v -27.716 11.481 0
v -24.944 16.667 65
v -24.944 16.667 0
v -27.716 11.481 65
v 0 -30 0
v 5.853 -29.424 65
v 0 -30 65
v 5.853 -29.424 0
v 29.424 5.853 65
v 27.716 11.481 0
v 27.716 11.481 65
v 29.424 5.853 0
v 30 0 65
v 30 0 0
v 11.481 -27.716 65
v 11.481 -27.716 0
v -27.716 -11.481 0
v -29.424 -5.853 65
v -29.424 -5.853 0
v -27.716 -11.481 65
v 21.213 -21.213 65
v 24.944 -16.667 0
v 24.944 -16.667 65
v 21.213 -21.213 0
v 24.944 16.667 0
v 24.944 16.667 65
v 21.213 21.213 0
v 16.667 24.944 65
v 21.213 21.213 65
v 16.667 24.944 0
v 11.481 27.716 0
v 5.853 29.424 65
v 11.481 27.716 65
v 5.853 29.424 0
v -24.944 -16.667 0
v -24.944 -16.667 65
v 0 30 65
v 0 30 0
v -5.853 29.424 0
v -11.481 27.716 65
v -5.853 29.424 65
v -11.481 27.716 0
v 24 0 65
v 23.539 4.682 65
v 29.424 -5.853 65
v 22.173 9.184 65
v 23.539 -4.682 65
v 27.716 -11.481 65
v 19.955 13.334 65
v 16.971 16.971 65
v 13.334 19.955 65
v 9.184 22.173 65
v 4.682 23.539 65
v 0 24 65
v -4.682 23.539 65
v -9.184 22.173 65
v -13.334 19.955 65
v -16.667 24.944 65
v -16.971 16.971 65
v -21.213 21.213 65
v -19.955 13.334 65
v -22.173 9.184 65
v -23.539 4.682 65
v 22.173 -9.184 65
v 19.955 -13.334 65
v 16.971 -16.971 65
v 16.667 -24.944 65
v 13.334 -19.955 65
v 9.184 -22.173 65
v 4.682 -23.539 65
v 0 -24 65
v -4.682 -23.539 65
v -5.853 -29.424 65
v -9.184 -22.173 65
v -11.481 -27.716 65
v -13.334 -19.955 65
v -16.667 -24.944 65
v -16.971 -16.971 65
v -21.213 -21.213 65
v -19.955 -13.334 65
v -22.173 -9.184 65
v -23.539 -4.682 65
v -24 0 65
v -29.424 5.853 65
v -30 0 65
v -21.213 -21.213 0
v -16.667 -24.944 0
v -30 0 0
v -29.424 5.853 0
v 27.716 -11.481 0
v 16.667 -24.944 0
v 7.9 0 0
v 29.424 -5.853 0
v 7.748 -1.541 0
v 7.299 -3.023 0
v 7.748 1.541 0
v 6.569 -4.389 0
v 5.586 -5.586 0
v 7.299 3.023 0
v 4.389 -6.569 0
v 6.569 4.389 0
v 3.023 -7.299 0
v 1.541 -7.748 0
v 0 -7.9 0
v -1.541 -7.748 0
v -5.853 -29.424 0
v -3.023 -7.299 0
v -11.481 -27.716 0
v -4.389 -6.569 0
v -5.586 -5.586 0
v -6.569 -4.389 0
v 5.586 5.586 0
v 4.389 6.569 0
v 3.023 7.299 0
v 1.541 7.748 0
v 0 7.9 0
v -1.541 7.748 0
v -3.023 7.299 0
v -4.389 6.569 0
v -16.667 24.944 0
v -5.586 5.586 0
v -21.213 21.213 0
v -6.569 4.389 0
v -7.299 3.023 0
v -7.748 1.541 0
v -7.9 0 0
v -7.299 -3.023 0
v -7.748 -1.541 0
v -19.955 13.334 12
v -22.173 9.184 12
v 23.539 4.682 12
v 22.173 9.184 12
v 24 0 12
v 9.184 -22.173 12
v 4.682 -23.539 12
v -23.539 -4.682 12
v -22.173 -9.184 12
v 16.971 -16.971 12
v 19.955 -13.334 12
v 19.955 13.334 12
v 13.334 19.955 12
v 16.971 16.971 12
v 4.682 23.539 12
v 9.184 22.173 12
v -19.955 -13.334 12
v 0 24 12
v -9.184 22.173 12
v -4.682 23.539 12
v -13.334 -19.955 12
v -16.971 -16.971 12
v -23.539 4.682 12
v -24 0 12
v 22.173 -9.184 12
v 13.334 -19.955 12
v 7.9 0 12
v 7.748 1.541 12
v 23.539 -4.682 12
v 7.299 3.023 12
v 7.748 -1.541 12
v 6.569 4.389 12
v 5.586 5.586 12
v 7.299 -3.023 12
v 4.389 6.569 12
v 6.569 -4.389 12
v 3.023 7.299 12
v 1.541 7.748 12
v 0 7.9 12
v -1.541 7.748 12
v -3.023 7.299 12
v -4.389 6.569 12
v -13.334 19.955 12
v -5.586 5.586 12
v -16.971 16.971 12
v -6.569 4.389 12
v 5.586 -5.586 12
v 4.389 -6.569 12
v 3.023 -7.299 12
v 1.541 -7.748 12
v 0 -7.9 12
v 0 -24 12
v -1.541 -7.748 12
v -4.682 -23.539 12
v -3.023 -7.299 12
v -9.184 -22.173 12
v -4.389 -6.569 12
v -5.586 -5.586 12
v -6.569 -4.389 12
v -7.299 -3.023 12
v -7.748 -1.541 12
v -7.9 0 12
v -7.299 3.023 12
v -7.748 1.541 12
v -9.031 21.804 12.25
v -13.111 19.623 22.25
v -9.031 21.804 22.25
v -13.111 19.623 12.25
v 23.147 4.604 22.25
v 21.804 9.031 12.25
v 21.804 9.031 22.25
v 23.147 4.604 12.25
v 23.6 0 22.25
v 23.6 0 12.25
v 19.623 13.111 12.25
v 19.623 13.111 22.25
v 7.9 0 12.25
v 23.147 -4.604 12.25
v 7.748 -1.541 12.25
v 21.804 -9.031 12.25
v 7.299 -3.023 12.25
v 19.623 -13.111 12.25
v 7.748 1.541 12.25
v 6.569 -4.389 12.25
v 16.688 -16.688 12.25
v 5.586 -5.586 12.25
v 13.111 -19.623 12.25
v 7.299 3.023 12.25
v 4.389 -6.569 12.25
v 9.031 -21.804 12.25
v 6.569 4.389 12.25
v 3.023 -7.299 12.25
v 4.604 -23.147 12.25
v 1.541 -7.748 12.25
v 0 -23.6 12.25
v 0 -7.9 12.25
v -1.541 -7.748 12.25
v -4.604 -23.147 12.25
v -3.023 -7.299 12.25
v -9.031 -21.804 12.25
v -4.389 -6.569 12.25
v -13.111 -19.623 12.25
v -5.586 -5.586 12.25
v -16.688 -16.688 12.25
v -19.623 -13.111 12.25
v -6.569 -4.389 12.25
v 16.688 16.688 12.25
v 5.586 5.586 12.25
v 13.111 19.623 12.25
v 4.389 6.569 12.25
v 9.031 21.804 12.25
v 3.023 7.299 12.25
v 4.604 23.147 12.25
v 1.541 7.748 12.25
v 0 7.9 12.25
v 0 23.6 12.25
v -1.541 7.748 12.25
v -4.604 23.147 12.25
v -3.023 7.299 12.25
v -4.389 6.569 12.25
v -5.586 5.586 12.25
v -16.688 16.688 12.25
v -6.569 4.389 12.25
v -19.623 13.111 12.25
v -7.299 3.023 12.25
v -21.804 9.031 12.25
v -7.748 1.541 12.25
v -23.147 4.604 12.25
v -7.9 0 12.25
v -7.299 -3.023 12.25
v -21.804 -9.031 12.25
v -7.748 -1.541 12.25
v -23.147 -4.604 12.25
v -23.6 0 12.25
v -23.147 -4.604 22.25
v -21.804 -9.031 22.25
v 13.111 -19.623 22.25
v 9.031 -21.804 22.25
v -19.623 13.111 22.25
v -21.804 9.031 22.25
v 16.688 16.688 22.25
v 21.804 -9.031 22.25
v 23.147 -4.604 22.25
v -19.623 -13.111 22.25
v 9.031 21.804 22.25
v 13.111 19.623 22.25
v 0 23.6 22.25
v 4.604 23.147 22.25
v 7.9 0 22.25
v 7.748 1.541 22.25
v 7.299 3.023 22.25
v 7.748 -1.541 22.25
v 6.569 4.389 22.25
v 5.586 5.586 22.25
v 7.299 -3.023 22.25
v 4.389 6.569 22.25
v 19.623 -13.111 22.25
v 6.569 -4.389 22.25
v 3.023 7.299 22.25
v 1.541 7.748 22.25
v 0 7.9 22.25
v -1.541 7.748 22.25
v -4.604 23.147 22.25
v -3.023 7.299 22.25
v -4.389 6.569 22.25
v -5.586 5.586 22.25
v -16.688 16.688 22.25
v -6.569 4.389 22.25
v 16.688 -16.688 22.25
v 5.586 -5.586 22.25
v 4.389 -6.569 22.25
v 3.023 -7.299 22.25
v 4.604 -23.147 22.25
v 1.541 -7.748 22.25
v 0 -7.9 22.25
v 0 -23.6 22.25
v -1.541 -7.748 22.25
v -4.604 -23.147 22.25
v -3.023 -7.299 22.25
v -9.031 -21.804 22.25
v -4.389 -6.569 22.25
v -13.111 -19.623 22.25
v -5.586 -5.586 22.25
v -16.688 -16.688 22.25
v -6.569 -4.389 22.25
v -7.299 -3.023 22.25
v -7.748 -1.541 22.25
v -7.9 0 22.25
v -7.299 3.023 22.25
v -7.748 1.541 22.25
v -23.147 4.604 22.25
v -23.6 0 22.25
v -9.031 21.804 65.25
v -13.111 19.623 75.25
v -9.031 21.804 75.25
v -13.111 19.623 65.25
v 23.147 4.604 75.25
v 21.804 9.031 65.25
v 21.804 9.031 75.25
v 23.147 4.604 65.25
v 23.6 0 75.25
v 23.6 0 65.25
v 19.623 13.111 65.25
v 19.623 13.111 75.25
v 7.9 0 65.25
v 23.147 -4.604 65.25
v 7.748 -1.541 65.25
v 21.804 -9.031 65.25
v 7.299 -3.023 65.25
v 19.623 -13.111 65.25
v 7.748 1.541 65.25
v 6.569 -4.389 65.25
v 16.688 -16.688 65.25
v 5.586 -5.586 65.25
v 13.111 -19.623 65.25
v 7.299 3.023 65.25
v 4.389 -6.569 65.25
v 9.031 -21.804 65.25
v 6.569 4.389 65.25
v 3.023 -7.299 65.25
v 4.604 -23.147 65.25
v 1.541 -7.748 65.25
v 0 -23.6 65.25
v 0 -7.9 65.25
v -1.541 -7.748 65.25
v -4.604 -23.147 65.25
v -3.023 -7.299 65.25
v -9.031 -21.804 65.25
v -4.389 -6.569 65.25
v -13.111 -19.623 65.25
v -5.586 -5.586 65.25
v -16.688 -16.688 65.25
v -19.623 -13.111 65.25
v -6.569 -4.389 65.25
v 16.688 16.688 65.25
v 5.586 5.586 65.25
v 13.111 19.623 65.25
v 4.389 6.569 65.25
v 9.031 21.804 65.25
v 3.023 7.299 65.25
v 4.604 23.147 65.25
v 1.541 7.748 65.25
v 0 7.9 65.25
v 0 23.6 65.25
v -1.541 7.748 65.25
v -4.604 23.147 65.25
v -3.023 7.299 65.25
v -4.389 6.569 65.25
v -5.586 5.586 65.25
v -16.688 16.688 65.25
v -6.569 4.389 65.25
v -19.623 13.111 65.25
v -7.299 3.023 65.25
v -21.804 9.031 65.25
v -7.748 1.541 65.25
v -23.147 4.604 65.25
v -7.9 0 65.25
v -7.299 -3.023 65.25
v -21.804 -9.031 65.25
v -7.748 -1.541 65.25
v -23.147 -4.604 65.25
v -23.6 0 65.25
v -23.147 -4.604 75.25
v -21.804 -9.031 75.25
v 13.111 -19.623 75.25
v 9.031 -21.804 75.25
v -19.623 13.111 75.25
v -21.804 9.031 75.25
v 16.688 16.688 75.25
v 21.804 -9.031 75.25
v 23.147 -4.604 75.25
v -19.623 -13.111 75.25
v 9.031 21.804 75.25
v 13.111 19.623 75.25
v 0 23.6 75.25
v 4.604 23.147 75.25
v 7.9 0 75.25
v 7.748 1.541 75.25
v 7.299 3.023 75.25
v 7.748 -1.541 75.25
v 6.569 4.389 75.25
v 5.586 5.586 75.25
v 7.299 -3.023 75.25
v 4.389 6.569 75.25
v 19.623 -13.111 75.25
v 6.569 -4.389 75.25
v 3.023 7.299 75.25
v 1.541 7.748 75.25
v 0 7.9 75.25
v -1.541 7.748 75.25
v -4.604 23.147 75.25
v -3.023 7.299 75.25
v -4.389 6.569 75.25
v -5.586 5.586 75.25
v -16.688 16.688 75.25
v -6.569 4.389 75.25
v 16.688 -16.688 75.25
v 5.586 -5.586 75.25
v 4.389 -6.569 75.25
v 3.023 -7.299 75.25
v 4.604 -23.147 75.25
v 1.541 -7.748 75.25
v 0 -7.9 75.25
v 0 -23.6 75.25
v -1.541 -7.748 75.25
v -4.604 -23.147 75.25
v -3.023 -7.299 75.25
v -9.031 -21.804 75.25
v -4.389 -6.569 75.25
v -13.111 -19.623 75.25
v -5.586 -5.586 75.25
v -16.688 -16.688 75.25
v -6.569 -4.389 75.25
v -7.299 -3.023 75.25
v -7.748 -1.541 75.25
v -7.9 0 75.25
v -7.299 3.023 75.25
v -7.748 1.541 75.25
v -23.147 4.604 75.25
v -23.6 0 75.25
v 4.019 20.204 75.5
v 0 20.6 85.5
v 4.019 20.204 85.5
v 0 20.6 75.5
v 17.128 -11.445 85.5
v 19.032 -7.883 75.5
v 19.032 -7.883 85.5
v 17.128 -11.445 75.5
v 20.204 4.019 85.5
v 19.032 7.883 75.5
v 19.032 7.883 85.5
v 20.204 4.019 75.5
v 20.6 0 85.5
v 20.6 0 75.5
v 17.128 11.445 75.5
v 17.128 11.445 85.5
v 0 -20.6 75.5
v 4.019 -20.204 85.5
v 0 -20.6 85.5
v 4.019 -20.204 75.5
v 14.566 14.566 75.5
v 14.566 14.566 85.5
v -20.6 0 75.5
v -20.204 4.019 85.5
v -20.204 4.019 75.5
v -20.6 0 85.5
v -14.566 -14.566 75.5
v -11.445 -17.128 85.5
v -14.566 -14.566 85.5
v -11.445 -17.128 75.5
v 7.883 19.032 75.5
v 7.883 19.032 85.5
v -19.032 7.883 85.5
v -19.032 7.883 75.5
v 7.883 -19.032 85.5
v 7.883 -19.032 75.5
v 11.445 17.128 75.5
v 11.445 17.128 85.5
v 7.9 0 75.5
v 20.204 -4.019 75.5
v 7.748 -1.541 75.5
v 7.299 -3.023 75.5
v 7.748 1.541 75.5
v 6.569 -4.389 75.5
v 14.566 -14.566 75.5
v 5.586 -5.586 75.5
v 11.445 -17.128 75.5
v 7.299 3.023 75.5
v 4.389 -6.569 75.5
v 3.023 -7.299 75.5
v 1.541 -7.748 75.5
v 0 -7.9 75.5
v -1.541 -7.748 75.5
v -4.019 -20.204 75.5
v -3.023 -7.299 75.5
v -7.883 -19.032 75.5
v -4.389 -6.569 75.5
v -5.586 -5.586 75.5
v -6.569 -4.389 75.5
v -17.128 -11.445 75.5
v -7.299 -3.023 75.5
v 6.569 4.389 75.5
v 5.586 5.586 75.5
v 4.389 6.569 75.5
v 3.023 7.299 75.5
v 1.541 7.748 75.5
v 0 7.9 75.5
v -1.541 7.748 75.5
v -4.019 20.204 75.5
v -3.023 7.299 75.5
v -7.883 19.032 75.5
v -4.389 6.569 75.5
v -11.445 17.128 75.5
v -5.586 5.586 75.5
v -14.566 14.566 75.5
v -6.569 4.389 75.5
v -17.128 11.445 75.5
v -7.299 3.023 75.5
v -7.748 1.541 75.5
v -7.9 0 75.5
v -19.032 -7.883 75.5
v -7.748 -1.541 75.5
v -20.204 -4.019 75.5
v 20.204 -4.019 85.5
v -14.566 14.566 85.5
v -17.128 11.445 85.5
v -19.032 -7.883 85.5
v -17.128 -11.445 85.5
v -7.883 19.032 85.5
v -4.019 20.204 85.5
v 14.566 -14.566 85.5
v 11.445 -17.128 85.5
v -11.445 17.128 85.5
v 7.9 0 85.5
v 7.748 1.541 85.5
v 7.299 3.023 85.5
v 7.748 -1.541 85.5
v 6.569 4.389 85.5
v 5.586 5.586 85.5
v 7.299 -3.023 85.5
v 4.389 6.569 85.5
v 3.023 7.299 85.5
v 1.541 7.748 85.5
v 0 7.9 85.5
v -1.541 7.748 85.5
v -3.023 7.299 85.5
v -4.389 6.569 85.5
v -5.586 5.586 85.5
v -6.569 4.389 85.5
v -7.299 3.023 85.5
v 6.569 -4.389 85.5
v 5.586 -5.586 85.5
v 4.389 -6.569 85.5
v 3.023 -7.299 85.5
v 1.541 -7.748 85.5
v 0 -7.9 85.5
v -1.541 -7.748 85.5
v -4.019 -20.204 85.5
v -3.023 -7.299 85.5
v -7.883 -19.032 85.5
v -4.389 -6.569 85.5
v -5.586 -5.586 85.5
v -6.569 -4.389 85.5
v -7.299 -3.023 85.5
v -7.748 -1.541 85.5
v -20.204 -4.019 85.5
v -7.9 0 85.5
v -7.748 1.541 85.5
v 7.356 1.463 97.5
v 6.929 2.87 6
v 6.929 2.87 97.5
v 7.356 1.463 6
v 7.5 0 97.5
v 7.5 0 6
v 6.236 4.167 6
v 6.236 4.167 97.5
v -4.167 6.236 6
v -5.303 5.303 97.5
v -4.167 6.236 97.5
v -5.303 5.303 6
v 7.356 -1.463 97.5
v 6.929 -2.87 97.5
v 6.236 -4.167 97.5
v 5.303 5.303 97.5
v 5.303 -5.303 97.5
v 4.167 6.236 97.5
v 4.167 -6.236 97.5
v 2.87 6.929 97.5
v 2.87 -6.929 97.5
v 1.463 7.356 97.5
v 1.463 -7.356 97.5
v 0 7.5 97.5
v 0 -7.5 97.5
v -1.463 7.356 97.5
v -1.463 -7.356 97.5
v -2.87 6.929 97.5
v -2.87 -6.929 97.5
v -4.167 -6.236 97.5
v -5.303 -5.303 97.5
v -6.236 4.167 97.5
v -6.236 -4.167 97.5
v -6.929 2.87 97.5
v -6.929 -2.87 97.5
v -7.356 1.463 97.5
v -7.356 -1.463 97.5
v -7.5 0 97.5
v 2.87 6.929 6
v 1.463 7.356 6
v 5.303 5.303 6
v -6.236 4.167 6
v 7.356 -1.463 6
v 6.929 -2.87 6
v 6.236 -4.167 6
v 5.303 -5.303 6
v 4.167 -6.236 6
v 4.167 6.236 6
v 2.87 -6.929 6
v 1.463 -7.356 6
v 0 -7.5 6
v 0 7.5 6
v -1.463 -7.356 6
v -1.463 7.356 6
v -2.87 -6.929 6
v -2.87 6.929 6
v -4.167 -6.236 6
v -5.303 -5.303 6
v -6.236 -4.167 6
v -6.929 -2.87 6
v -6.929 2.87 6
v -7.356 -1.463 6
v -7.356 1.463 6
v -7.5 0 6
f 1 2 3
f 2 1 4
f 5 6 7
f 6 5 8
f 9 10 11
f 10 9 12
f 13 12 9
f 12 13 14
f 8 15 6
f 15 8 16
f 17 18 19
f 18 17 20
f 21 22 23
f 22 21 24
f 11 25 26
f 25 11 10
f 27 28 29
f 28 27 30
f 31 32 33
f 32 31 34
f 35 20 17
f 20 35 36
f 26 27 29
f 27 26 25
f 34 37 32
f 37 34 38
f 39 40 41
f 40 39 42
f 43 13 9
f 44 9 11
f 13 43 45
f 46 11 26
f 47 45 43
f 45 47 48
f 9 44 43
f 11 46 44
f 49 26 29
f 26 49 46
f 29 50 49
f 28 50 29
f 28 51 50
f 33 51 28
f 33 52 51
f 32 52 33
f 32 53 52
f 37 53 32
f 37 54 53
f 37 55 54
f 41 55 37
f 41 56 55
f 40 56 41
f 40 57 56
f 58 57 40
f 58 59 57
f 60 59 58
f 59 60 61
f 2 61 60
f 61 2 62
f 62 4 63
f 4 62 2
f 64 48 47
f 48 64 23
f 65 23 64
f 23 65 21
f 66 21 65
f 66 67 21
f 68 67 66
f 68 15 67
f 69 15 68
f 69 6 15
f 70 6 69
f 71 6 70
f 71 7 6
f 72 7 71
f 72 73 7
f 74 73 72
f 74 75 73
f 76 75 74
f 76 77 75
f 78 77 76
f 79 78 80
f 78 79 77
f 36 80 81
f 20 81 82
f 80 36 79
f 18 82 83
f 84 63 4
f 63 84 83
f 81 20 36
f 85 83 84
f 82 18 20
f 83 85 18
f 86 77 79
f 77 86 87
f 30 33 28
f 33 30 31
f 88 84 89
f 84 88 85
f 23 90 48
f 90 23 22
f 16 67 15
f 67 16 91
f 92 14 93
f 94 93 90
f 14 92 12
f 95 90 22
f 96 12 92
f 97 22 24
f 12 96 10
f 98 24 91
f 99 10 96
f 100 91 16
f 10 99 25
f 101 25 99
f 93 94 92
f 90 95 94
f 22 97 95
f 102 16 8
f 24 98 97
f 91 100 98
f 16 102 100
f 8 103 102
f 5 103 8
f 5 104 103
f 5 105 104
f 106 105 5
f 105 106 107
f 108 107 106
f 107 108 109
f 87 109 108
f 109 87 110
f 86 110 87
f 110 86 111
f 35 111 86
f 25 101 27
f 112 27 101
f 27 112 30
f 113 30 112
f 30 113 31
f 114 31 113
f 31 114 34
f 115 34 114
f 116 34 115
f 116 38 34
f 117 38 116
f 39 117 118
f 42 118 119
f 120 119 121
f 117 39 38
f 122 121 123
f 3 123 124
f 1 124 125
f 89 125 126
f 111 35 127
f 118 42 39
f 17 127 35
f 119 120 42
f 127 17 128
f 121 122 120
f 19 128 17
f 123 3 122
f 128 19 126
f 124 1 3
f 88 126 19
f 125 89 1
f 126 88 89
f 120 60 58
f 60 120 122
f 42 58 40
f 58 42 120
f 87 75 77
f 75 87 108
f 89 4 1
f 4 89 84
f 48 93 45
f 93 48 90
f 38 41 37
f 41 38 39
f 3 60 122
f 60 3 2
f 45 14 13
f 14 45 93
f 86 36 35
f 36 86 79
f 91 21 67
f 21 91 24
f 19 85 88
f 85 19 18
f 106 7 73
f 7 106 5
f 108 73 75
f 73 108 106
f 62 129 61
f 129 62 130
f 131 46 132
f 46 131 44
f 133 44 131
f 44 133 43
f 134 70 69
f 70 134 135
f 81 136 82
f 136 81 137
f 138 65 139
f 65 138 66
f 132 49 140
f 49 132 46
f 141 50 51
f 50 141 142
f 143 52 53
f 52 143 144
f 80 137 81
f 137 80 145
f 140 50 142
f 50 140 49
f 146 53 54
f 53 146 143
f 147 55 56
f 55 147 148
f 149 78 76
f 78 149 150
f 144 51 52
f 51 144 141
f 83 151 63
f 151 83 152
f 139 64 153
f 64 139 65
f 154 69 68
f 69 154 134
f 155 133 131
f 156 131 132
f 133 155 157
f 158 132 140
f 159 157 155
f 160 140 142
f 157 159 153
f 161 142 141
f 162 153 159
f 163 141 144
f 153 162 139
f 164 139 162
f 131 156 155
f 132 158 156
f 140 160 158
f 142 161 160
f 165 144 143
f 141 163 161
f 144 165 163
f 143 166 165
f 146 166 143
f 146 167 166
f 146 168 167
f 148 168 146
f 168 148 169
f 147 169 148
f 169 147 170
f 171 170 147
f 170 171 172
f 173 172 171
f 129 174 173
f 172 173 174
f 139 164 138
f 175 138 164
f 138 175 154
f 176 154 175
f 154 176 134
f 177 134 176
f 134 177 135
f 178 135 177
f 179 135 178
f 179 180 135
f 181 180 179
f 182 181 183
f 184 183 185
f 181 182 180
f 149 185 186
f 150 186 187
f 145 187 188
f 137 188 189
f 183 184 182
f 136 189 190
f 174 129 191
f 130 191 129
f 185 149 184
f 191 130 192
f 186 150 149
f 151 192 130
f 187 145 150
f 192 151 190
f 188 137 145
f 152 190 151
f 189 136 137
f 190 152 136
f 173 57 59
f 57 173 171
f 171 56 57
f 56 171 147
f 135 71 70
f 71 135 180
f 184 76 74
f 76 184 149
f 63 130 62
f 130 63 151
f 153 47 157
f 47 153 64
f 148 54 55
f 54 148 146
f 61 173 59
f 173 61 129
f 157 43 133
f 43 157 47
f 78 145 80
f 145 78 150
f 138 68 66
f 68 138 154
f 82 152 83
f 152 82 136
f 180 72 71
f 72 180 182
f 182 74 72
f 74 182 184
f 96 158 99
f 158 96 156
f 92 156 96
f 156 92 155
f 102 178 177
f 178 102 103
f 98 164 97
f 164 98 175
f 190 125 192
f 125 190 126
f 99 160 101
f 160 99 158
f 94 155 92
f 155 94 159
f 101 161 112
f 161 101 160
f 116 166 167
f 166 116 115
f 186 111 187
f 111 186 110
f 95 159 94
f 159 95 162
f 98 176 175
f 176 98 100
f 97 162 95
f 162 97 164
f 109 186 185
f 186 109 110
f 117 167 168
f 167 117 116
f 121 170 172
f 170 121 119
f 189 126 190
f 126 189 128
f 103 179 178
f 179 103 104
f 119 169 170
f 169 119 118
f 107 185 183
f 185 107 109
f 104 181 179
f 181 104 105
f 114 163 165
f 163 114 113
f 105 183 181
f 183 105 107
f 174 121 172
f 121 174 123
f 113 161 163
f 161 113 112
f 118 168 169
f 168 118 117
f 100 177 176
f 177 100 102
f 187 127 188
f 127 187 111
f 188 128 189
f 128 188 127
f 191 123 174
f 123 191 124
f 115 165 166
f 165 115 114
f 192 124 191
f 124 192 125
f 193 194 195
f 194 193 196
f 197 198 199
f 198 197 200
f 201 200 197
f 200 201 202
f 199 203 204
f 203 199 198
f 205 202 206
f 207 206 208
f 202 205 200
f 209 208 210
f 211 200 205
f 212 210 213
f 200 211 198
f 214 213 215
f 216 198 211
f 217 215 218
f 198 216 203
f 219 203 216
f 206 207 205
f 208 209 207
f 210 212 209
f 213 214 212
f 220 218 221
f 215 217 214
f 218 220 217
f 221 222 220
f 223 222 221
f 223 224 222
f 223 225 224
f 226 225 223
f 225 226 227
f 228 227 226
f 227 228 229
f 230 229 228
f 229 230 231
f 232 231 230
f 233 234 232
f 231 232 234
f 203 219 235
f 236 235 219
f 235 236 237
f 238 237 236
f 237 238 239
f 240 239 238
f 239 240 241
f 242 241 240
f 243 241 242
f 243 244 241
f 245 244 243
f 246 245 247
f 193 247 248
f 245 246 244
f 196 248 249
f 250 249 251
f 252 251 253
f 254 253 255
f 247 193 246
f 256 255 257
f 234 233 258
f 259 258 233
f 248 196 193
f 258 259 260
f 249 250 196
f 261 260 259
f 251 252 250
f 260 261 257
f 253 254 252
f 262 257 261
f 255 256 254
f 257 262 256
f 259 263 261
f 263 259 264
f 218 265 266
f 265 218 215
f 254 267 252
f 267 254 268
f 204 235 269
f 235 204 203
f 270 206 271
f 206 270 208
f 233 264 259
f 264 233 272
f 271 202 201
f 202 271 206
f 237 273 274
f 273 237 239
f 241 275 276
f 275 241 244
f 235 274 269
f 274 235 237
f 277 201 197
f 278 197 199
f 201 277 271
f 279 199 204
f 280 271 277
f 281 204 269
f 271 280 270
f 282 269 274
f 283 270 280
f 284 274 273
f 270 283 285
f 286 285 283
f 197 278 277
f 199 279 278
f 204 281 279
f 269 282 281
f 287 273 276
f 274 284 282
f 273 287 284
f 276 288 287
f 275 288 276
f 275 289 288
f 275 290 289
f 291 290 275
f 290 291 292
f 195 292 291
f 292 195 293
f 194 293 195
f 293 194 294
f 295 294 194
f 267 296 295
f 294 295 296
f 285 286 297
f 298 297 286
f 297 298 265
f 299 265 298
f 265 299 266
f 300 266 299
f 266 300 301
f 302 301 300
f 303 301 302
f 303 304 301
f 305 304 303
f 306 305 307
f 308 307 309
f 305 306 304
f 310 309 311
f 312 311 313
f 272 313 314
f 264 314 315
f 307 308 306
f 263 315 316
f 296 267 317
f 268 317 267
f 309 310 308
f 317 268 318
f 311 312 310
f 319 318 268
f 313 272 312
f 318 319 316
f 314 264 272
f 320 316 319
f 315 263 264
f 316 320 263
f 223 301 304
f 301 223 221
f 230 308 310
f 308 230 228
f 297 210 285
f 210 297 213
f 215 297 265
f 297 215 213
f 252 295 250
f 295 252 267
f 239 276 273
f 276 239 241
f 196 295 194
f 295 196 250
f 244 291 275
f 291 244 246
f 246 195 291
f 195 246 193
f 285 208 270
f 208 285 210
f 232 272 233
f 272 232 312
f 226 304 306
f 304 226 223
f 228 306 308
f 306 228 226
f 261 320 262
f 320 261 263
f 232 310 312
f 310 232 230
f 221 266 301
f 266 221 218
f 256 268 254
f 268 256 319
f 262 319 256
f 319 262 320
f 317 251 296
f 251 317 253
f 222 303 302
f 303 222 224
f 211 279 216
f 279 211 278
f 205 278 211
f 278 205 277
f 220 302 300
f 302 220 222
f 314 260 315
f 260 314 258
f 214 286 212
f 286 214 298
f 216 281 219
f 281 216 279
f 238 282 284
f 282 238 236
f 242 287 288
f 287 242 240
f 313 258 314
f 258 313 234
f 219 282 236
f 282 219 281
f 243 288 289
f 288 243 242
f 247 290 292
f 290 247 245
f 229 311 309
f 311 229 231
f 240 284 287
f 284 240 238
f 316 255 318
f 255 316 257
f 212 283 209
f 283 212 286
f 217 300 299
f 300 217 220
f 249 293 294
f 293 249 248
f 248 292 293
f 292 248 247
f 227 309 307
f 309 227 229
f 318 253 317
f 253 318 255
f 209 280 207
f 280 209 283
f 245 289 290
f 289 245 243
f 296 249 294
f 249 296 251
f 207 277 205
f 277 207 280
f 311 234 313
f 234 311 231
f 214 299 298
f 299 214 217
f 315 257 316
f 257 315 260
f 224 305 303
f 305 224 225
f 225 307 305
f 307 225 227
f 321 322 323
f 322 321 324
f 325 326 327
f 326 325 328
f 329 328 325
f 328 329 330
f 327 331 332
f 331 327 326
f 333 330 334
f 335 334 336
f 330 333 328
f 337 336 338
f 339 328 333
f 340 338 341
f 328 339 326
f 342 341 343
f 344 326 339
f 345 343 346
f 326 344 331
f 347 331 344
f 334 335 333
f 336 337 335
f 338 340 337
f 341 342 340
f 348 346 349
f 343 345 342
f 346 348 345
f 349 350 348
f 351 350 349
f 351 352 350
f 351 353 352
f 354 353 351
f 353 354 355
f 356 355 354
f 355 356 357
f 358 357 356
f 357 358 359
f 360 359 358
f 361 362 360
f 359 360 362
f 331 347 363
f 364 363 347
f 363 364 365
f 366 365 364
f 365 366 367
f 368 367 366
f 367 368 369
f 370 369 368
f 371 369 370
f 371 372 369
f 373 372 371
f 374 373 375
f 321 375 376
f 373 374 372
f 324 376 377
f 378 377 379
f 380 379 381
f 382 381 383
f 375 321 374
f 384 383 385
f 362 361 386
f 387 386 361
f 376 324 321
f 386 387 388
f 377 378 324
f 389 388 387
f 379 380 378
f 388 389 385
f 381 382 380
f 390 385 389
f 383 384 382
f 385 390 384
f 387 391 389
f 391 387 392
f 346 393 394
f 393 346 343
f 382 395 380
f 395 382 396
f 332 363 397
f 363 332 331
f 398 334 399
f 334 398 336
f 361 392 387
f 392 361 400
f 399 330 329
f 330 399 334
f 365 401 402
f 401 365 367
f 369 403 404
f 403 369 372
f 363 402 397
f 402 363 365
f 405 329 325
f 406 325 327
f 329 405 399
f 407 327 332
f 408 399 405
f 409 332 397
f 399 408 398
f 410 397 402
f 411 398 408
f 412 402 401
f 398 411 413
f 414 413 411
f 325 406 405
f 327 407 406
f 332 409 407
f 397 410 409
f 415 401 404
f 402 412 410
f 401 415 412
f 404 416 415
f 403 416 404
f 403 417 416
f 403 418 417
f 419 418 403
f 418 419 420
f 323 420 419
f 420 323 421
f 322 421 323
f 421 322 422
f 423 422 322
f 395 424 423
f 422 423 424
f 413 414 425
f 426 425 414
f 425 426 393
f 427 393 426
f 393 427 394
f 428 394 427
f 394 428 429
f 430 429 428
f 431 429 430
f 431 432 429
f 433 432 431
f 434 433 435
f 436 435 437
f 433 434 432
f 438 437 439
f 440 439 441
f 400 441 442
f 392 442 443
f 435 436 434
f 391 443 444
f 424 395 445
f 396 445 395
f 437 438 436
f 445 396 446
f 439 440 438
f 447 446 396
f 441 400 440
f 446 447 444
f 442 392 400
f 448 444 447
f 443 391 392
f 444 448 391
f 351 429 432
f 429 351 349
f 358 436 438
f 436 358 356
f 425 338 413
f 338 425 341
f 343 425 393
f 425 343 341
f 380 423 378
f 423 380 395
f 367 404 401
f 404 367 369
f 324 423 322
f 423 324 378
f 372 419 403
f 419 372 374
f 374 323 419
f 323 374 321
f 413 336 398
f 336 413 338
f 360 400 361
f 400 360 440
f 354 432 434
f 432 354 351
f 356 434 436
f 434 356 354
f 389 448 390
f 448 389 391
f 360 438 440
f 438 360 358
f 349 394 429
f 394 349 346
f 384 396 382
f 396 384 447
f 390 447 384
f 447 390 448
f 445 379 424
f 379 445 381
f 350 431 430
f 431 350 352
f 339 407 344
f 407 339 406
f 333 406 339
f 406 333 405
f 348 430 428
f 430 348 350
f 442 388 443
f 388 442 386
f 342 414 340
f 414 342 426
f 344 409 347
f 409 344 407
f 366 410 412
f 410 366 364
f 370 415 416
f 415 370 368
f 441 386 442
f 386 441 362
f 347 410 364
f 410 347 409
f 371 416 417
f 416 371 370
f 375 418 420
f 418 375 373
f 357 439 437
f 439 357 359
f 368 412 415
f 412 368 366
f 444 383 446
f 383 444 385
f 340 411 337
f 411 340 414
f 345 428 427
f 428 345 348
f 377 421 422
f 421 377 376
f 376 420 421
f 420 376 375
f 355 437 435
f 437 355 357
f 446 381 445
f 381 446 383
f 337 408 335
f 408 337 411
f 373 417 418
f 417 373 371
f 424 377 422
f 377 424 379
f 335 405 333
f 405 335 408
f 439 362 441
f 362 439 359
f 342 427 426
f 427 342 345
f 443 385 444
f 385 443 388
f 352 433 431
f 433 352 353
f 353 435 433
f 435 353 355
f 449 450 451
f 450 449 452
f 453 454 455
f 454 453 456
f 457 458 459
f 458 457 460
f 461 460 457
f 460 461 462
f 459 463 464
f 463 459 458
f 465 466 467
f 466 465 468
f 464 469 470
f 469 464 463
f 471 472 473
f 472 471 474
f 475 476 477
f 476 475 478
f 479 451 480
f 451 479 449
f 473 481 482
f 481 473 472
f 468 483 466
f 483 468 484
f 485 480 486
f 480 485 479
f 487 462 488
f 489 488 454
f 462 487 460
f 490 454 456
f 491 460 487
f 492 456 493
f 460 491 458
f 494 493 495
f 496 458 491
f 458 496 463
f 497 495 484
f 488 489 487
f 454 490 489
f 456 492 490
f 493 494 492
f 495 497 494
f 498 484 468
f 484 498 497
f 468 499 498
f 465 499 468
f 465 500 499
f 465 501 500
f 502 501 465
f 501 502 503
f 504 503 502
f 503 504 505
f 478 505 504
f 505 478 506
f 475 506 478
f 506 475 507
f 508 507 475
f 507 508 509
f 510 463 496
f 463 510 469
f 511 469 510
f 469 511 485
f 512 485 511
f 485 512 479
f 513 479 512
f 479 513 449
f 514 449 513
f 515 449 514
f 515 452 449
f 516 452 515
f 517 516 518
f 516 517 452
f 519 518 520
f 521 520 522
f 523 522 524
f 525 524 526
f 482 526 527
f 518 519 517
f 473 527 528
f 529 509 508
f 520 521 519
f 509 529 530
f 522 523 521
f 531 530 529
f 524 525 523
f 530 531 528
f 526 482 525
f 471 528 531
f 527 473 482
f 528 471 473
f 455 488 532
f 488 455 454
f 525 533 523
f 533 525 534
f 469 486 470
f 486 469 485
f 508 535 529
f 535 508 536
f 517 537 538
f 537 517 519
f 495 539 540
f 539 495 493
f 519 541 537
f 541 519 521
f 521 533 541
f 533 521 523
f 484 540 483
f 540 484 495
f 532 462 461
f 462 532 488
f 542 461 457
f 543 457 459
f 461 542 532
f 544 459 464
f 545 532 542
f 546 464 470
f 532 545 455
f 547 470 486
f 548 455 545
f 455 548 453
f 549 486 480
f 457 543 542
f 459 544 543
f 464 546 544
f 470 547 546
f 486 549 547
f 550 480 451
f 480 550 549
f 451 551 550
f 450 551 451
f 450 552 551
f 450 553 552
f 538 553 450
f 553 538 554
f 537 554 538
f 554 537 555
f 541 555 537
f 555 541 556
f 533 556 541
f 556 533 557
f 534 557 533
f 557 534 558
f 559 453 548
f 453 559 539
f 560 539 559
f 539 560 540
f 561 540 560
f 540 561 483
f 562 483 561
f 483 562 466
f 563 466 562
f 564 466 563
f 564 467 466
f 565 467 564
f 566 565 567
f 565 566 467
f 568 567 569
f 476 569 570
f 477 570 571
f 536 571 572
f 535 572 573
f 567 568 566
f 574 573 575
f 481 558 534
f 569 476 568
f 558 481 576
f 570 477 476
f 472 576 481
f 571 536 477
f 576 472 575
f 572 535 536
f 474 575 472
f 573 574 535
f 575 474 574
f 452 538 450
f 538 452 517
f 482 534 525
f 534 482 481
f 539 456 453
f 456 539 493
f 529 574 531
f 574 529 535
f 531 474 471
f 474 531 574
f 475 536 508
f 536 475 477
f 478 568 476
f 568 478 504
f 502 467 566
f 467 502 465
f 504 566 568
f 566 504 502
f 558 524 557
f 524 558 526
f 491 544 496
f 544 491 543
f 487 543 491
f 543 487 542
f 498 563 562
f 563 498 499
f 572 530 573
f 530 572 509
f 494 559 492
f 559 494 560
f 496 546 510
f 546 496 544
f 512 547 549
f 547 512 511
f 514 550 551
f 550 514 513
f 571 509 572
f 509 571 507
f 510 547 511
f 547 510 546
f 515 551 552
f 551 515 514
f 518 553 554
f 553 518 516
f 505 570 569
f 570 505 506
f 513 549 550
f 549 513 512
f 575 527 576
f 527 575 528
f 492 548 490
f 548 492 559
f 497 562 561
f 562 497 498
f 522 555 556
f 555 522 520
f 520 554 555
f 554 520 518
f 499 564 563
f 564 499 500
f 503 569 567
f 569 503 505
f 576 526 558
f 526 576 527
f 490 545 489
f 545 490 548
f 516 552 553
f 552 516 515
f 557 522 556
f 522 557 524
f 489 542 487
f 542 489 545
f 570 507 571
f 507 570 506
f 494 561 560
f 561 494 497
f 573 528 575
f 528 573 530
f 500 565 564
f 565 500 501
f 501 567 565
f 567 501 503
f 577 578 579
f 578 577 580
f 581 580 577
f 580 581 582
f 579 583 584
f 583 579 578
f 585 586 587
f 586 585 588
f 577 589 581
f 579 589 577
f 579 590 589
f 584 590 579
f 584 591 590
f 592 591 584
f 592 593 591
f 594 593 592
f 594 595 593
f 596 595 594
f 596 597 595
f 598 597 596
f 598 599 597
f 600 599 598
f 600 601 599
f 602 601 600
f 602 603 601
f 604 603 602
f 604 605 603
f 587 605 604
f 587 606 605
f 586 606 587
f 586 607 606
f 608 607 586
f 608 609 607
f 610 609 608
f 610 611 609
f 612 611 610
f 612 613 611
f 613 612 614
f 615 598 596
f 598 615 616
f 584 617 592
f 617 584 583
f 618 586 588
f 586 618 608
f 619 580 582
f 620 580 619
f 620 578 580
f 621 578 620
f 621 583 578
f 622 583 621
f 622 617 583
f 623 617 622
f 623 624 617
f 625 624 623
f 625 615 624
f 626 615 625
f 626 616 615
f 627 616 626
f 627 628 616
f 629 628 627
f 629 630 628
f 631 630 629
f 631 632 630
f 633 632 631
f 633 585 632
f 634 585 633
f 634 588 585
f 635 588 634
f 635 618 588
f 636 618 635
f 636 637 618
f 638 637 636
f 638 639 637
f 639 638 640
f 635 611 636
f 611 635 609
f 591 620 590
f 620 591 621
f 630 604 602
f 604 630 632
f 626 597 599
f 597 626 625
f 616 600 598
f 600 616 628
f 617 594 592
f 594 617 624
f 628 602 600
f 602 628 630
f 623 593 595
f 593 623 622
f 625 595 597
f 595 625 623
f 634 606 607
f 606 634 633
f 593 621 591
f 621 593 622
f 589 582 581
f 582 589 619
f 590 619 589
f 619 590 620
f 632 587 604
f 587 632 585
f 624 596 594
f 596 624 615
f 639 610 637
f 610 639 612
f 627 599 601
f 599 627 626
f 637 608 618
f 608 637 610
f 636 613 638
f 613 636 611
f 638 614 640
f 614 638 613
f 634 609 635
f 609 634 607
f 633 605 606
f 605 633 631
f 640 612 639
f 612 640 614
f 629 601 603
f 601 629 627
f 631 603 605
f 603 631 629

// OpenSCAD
$fn = 32;

// ------------------------------------------------------------------------
// Bearing housing: housing d60, two bearings and a shaft
// Every part is its own module, assembly() places them once.
// ------------------------------------------------------------------------

// --- part 1 ---
module housing() {
  difference() {
    cylinder(h = 65, d = 60);
    translate([0, 0, 12]) cylinder(h = 54, d = 48);
    translate([0, 0, -1]) cylinder(h = 14, d = 15.8);
  }
}

// --- part 2 ---
module bearing_lower() {
  difference() {
      translate([0, 0, 0]) cylinder(h = 10, d = 47.2);
      translate([0, 0, -1]) cylinder(h = 12, d = 15.8);
    }
}

// --- part 3 ---
module bearing_upper() {
  difference() {
      translate([0, 0, 0]) cylinder(h = 10, d = 47.2);
      translate([0, 0, -1]) cylinder(h = 12, d = 15.8);
    }
}

// --- part 4 ---
module spacer() {
  difference() {
      translate([0, 0, 0]) cylinder(h = 10, d = 41.2);
      translate([0, 0, -1]) cylinder(h = 12, d = 15.8);
    }
}

// --- part 5 ---
module shaft() {
  translate([0, 0, -45.75]) cylinder(h = 91.5, d = 15);
}

// --- assembly ---
module assembly() {
  translate([0, 0, 0]) rotate([0, 0, 0]) housing();
  translate([0, 0, 12.25]) rotate([0, 0, 0]) bearing_lower();
  translate([0, 0, 65.25]) rotate([0, 0, 0]) bearing_upper();
  translate([0, 0, 75.5]) rotate([0, 0, 0]) spacer();
  translate([0, 0, 51.75]) rotate([0, 0, 0]) shaft();
}

assembly();
